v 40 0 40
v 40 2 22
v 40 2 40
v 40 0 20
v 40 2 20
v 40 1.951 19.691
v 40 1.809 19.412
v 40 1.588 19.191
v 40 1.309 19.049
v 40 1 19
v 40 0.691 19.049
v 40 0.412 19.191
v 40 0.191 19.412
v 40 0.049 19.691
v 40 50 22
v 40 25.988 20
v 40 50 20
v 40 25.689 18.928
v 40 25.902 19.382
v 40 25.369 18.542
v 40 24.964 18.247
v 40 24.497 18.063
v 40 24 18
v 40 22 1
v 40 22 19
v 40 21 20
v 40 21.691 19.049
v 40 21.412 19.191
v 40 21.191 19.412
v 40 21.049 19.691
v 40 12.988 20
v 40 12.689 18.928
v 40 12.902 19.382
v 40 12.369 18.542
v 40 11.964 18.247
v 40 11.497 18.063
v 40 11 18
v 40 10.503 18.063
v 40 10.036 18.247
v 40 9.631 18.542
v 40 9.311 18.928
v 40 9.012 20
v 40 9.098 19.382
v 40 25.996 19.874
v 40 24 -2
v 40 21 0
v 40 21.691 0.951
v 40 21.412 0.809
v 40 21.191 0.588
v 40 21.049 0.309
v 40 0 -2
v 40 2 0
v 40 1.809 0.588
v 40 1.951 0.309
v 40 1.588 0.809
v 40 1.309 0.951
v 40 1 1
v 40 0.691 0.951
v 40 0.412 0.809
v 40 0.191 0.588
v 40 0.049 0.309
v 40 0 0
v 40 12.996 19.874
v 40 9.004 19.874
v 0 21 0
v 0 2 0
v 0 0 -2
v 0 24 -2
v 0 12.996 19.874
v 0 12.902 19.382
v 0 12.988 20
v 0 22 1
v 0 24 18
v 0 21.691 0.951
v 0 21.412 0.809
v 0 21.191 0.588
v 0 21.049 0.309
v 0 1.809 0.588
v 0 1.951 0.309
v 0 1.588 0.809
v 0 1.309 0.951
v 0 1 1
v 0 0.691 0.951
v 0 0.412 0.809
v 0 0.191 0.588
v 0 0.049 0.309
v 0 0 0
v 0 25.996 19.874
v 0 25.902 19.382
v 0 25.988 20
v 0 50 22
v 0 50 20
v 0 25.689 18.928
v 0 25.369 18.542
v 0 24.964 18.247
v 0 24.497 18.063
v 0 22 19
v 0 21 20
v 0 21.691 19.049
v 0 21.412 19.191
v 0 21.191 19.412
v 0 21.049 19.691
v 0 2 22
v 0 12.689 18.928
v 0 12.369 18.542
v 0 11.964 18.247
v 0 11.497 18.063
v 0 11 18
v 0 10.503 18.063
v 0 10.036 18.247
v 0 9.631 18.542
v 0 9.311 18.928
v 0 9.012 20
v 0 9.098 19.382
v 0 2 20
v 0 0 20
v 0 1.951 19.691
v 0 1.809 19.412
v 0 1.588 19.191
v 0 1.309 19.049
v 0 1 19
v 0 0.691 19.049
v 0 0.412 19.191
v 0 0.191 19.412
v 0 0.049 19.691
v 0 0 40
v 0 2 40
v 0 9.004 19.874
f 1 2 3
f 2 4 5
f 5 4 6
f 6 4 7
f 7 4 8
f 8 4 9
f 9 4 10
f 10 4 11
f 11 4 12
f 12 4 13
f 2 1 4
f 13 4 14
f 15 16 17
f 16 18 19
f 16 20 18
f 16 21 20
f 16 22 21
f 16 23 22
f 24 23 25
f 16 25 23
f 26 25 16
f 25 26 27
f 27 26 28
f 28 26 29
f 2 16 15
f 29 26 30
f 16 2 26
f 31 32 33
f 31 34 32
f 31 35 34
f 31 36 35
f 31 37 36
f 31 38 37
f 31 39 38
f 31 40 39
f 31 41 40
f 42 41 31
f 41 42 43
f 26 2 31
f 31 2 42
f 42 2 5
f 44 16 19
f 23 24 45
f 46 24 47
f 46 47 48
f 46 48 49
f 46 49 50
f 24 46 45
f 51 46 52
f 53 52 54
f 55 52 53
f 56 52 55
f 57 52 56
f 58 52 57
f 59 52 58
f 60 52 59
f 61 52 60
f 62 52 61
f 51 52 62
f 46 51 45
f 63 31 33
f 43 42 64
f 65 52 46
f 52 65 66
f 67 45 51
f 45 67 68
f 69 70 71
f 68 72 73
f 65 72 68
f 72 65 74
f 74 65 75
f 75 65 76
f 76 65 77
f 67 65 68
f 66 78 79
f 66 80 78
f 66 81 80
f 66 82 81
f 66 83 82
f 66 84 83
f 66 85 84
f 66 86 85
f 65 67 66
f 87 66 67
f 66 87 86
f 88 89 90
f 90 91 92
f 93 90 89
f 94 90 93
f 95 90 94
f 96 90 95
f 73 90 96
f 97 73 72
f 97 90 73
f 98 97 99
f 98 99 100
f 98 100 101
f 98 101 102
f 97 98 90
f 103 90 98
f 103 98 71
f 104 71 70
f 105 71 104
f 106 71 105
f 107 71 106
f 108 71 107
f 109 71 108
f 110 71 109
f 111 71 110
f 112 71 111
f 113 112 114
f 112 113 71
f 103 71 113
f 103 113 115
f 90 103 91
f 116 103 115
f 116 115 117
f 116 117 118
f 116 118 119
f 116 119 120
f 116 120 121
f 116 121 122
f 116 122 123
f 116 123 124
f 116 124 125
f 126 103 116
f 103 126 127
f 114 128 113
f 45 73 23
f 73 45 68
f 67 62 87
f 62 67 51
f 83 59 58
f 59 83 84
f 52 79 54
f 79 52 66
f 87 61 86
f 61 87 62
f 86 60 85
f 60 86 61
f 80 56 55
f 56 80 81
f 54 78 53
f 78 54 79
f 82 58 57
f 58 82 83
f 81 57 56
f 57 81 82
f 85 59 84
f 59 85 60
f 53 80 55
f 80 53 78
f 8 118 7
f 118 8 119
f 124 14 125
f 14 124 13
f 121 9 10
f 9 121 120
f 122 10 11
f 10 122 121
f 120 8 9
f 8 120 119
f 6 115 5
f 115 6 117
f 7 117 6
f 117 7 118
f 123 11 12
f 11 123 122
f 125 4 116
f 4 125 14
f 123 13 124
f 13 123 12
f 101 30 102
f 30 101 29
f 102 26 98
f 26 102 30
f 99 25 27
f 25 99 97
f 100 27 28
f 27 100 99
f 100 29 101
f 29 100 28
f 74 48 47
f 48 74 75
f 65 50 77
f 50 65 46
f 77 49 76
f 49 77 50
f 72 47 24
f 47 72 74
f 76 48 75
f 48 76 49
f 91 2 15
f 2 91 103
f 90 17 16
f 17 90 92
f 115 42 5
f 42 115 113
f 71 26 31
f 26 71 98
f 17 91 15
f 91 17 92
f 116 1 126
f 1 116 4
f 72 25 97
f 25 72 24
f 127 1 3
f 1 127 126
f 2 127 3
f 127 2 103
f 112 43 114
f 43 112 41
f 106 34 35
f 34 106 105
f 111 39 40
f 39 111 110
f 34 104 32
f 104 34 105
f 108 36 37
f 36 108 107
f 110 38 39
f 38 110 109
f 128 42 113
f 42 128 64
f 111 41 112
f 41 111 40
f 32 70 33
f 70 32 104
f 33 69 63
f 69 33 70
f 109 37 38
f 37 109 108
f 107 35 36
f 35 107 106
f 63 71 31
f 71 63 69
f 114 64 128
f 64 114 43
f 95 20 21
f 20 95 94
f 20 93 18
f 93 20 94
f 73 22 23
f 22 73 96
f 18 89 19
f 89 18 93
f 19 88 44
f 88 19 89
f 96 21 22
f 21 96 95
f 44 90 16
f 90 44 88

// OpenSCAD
/* [Dimensions] */
// Base Length
LEN_BASE = 50;// [30:60]
// Base width
WIDTH = 40;//[20:120]
// Thickness of Base and Back
THICK = 2; //[2:4]
SIZE=20; //[20:30]

// -----------------------------
// Define Modules
// -----------------------------

module holder(width,depth,size, thickness){
    translate([0,0,-thickness])cube([width,size+2*thickness,thickness]);
    translate([0,1,0])rotate([0,90,0])cylinder(h=width, r= 1, $fn = 20);
    translate([0,1,size])rotate([0,90,0])cylinder(h=width, r= 1, $fn = 20);
    translate([0,size+thickness,size])rotate([0,90,0])cylinder(h=width, r= 1, $fn = 20);
    translate([0,size+thickness,0])rotate([0,90,0])cylinder(h=width, r= 1, $fn = 20);
    translate([0,0,size])cube([width,depth,thickness]);
    translate([0,size+thickness,0])cube([width,thickness,size]);
    translate([0,0,size])cube([width,thickness,size]);
    translate([0,(size+thickness)/2,size])rotate([0,90,0])cylinder(h=width, r= 2, $fn = 25);
    translate([0,size+2*thickness,size])rotate([0,90,0])cylinder(h=width, r= 2, $fn = 25);
    }


// -----------------------------
// Put Components together
// -----------------------------


translate([0,0,0])holder(WIDTH,LEN_BASE,SIZE,THICK);
